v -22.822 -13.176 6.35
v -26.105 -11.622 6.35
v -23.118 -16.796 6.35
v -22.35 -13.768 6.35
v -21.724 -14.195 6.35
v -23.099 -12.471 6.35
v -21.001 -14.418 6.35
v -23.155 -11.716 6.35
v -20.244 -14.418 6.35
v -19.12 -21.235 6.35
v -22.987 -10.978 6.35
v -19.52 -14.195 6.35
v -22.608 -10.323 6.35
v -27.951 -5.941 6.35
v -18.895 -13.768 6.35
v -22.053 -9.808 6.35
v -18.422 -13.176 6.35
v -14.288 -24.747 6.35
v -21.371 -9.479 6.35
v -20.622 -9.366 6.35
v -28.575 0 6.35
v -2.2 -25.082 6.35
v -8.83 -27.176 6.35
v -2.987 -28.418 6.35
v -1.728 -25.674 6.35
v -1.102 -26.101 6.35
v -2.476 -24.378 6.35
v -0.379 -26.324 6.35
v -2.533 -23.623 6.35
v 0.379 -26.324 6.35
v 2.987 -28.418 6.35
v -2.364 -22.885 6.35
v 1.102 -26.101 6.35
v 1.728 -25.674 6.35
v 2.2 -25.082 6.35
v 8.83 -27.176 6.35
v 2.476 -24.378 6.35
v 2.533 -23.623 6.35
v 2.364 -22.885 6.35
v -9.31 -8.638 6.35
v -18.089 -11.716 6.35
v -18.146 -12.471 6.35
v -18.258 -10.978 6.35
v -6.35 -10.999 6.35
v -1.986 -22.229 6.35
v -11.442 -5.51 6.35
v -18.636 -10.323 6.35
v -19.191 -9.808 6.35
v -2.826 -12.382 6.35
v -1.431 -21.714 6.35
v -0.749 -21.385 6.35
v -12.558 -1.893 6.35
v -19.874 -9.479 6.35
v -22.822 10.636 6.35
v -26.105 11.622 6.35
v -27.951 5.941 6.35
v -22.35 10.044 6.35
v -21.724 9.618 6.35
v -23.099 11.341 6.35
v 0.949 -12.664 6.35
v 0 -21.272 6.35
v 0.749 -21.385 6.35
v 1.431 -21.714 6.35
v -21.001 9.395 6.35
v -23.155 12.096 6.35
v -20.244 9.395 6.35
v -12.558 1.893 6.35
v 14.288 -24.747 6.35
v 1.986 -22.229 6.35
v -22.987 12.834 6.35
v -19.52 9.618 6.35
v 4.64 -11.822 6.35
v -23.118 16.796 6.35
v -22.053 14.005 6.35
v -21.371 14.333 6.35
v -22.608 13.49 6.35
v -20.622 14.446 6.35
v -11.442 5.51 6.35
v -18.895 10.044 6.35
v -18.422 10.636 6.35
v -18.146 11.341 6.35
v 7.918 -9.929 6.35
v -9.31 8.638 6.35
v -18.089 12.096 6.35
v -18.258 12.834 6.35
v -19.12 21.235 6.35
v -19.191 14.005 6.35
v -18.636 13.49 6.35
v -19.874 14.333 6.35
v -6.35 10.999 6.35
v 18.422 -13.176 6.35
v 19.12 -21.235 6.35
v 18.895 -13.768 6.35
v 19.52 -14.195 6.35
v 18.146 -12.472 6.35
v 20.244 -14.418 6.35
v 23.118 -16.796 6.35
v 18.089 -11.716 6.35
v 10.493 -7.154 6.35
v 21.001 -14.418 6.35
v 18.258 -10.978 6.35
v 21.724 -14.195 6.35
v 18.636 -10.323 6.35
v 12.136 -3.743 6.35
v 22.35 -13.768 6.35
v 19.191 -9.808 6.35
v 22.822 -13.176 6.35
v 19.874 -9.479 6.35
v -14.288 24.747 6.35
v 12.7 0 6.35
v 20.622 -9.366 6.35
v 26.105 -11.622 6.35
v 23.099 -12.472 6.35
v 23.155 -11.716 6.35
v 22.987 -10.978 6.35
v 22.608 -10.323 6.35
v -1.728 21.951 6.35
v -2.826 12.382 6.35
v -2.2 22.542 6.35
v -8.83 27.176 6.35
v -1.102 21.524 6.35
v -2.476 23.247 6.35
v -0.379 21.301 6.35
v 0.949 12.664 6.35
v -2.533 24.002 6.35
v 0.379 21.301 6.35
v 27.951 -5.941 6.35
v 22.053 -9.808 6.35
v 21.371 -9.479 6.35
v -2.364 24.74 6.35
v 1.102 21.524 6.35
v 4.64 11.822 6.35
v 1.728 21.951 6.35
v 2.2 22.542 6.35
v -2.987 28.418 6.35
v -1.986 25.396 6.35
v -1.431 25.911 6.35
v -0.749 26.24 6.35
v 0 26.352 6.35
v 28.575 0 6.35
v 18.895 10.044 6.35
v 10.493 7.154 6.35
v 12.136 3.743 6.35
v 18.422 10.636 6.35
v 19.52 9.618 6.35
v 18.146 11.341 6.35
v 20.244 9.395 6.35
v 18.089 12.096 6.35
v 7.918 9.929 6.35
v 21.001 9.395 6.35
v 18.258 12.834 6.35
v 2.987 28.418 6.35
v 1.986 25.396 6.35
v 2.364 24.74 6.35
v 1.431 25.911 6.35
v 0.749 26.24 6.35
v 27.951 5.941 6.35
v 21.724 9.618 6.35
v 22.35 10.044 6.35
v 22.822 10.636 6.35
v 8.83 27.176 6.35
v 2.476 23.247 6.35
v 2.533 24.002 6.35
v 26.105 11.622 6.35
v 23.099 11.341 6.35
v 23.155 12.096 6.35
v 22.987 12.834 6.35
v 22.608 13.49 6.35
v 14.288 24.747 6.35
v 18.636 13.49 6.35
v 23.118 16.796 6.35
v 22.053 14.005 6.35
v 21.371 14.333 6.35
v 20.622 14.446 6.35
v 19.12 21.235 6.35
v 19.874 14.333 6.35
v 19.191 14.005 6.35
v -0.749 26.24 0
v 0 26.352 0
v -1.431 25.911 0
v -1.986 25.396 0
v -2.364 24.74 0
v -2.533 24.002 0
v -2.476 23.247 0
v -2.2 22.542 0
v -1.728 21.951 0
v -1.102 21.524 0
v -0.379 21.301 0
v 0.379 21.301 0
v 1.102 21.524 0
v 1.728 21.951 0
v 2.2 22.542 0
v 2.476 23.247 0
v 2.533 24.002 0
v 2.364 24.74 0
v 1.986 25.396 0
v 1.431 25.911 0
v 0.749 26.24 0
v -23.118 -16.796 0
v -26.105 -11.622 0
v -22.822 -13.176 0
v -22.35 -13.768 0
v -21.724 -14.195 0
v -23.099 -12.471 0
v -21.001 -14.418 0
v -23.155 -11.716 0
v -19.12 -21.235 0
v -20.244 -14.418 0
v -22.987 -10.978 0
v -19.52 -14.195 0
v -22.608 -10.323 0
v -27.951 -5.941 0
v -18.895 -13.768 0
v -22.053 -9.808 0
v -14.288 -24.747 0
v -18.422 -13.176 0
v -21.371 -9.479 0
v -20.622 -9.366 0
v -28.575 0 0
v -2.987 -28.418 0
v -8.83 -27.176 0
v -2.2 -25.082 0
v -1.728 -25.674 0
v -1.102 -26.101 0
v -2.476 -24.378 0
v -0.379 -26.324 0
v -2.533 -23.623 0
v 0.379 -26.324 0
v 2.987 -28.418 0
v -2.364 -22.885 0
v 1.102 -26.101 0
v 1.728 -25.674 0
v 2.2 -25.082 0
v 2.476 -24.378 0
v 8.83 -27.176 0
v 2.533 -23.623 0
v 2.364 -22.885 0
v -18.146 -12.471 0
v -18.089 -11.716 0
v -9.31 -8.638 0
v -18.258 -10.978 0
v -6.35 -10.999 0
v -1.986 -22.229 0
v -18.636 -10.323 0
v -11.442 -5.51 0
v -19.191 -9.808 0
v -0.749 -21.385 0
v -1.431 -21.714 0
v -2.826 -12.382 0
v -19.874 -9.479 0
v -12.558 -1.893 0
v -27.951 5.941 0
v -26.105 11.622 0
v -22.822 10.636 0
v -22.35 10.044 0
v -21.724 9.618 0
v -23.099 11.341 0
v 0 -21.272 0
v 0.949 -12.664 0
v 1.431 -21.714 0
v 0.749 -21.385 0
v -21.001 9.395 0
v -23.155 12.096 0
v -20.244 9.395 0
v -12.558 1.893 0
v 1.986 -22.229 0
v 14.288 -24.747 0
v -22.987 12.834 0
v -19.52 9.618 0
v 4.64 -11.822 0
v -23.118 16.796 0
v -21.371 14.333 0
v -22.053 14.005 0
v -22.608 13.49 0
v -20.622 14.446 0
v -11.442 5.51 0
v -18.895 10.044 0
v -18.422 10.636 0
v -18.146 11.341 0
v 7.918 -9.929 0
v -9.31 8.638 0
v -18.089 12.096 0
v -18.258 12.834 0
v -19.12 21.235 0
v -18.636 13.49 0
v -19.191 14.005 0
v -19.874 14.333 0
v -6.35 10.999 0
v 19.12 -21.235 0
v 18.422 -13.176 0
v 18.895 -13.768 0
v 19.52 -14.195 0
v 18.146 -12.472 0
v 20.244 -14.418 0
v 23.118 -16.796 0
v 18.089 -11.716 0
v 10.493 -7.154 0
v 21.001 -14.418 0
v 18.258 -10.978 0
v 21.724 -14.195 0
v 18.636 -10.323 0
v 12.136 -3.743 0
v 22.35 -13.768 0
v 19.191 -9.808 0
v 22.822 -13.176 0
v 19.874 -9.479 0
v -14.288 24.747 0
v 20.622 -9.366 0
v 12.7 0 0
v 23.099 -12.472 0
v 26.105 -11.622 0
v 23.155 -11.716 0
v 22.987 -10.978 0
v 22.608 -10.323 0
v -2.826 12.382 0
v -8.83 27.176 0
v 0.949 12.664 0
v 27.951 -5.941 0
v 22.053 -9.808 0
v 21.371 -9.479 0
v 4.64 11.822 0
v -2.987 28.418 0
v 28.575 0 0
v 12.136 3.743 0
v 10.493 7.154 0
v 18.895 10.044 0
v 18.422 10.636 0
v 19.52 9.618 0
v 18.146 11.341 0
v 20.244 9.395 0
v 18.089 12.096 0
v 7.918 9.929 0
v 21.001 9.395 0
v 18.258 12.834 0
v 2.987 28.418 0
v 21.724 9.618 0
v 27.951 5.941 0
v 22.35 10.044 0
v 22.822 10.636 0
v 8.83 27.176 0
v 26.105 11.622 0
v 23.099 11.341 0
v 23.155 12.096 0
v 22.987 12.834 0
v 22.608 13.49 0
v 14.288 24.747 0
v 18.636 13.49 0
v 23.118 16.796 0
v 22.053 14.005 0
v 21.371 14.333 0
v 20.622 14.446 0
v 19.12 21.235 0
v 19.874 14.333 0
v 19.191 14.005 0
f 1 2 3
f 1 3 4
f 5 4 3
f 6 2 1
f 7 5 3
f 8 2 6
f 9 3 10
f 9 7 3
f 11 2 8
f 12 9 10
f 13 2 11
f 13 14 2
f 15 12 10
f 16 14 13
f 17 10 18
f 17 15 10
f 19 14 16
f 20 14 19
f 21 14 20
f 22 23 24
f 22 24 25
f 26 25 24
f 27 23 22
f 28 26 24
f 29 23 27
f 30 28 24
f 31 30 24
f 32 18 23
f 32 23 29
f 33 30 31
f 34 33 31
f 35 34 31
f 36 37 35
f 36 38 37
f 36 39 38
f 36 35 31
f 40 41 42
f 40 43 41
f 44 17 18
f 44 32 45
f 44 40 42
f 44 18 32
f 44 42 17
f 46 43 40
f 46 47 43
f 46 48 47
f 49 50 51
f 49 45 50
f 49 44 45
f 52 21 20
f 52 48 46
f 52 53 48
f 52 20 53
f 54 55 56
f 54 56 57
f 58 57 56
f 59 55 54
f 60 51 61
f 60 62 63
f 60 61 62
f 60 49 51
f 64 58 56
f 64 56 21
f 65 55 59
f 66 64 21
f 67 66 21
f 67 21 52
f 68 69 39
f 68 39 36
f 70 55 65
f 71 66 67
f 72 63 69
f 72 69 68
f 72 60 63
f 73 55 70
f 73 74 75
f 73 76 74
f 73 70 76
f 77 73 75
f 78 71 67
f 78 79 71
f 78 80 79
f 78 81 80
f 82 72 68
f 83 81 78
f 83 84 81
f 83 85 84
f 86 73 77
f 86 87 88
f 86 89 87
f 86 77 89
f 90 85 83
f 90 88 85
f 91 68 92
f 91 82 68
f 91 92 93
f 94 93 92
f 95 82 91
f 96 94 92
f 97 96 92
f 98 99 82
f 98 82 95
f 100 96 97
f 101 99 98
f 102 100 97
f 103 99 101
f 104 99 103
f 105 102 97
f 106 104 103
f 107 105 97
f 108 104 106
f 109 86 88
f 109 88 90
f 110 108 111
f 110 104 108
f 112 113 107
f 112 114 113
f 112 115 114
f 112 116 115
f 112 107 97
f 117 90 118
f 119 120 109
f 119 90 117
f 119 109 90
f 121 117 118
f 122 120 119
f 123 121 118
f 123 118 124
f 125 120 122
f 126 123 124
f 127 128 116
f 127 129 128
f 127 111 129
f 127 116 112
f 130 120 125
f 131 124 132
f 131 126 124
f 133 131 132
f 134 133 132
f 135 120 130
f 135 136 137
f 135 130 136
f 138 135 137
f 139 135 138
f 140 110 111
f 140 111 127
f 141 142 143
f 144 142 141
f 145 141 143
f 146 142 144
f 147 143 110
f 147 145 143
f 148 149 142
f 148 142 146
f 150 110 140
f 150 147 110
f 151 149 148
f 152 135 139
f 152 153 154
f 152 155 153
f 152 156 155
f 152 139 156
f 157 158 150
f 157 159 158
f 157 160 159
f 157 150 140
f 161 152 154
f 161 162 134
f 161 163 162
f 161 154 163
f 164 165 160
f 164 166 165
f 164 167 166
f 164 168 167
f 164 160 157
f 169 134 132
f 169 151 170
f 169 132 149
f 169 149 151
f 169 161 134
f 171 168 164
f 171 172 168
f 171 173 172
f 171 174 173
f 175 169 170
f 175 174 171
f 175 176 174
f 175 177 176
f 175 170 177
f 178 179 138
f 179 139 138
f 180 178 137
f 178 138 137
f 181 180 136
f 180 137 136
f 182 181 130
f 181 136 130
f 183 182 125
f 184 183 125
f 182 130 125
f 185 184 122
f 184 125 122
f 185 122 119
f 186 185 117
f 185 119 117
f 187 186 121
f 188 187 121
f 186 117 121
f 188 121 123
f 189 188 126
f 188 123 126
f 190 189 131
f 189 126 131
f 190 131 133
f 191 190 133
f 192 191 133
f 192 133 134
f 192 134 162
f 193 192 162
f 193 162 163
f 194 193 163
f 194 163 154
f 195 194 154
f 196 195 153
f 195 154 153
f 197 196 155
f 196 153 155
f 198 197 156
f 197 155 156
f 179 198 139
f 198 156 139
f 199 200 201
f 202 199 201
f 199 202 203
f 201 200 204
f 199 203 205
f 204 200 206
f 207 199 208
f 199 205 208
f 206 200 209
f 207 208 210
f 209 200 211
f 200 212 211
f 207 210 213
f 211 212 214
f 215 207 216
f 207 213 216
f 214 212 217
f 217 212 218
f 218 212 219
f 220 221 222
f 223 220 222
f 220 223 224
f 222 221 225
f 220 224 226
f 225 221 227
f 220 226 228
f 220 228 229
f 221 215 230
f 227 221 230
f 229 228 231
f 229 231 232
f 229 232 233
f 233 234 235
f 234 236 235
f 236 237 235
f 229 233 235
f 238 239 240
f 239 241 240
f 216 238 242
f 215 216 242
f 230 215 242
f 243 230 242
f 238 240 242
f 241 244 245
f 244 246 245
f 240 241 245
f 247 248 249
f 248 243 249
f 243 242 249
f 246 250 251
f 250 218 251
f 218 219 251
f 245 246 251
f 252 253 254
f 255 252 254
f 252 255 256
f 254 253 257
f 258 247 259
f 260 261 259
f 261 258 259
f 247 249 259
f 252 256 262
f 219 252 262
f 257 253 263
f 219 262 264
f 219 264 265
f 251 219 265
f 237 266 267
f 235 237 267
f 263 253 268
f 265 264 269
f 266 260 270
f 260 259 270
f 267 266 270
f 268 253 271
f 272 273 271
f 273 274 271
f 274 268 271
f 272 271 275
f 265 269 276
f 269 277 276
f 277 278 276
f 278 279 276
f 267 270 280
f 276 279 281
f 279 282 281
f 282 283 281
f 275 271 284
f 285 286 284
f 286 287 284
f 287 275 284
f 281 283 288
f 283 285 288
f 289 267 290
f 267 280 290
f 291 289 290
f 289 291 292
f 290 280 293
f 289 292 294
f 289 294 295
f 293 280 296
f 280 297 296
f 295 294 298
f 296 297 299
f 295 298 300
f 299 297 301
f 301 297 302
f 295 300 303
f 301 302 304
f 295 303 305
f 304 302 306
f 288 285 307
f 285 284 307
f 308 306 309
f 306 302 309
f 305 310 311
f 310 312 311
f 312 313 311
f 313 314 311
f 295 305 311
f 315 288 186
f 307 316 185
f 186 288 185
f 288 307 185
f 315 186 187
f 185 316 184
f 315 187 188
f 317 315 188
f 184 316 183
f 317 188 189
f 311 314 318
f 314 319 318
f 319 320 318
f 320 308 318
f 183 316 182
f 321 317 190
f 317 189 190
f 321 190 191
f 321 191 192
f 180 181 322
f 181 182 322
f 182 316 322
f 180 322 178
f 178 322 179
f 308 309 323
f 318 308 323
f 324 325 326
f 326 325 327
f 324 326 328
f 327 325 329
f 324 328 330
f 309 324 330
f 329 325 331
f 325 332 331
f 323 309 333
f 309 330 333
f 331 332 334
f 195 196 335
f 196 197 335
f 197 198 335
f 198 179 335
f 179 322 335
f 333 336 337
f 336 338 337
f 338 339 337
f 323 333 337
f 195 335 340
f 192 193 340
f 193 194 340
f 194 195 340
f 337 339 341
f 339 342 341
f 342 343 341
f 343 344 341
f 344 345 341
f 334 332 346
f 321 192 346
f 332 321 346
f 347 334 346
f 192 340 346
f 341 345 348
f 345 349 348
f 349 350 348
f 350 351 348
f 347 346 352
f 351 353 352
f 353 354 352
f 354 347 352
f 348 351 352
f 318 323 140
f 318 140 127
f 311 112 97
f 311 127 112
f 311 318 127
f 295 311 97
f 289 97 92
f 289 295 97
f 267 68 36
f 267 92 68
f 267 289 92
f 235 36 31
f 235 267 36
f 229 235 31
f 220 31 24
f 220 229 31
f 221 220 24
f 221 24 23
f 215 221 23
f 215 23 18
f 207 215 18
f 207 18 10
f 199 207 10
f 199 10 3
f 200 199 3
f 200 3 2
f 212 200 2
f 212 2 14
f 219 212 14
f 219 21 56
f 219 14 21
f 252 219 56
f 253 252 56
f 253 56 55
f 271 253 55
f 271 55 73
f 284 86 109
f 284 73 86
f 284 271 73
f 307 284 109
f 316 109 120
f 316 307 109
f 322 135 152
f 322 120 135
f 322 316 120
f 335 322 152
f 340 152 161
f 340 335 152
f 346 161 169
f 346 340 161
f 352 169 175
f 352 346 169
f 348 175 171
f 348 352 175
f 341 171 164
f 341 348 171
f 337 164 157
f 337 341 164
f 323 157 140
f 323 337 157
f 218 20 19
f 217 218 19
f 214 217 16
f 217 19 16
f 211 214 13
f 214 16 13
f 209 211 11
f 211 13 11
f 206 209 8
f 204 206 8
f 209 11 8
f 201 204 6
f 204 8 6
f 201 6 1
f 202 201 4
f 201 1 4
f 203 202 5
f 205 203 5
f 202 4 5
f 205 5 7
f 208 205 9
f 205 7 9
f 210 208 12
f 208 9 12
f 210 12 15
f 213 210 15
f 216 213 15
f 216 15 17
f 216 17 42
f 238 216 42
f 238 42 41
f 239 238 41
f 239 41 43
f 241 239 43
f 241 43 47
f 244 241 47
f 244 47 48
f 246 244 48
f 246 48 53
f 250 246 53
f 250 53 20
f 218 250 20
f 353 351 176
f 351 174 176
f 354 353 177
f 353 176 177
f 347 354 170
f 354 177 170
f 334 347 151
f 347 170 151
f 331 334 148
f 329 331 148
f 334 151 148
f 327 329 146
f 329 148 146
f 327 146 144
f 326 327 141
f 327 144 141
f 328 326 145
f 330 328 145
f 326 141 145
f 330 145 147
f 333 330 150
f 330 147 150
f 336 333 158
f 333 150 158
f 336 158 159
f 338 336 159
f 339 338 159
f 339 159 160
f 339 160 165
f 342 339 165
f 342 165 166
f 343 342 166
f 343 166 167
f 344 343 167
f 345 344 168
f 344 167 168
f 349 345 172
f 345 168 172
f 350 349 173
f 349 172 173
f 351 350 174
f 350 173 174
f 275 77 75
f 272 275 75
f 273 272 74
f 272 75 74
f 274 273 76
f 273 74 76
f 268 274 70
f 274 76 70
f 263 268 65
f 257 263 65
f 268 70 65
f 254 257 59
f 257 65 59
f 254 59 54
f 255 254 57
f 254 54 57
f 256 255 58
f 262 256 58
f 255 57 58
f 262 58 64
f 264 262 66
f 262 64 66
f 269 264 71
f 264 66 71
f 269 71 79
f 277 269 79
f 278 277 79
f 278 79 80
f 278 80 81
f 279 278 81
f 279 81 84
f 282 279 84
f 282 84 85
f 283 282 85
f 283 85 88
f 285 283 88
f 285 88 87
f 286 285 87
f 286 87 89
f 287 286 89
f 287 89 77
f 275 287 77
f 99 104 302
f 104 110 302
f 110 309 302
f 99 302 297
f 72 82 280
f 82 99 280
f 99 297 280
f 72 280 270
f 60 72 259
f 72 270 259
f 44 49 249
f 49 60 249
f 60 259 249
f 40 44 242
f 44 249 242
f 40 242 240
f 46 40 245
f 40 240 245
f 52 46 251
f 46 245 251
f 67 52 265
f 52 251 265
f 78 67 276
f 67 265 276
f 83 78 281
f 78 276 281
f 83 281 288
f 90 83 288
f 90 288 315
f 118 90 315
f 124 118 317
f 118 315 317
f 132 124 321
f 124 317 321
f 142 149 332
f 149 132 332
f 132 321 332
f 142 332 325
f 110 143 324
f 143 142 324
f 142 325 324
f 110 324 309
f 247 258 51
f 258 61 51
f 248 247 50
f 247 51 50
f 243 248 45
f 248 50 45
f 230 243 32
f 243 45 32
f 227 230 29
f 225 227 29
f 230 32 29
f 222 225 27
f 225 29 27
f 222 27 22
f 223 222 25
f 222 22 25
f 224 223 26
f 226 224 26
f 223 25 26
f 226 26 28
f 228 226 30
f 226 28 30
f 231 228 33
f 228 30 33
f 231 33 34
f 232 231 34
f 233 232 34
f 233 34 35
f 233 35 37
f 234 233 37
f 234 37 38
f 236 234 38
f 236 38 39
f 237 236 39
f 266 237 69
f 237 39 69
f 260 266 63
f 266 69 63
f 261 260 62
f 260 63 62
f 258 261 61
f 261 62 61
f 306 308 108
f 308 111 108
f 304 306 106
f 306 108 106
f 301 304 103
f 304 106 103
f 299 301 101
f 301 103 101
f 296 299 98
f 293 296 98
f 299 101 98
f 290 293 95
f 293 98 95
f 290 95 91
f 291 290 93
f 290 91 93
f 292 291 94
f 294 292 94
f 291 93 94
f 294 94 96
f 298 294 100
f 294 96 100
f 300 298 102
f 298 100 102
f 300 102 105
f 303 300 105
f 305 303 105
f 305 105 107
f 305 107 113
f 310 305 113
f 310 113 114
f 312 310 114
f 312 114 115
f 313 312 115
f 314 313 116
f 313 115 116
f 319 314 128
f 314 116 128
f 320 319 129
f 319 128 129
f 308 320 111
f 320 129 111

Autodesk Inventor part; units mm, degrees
ref_plane "YZ Plane" through (0, 0, 0) normal (1, 0, 0) x (0, 1, 0)
ref_plane "XZ Plane" through (0, 0, 0) normal (0, 1, 0) x (-1, 0, 0)
ref_plane "XY Plane" through (0, 0, 0) normal (0, 0, 1) x (1, 0, 0)
sketch "Sketch1" plane through (0, 0, 0) normal (0, 0, 1) x (1, 0, 0)
  circle A0 centre (0, 0) radius 28.575
  circle A1 centre (0, 0) radius 23.8125
  circle A2 centre (0, 0) radius 12.7
  point P0 (20.6222, -11.9063)
  point P1 (20.6222, 11.9062)
  point P2 (0, 23.8125)
  point P3 (-20.6222, 11.9063)
  point P4 (-20.6222, -11.9062)
  point P5 (0, -23.8125)
  dimension "d1" = 47.625
  dimension "d0" = 57.15
  dimension "d4" = 360
  dimension "d6" = 25.4
extrude "Extrusion1" add sketch "Sketch1" along normal blind 6.35 contours A0 | A1
hole "Hole1" at (20.6222, -11.9063, 0) at (20.6222, 11.9062, 0) at (0, 23.8125, 0) at (-20.6222, 11.9063, 0) at (-20.6222, -11.9062, 0) at (0, -23.8125, 0) direction (0, 0, 1) diameter 5.08 end through all
properties part number "lower box hub"
